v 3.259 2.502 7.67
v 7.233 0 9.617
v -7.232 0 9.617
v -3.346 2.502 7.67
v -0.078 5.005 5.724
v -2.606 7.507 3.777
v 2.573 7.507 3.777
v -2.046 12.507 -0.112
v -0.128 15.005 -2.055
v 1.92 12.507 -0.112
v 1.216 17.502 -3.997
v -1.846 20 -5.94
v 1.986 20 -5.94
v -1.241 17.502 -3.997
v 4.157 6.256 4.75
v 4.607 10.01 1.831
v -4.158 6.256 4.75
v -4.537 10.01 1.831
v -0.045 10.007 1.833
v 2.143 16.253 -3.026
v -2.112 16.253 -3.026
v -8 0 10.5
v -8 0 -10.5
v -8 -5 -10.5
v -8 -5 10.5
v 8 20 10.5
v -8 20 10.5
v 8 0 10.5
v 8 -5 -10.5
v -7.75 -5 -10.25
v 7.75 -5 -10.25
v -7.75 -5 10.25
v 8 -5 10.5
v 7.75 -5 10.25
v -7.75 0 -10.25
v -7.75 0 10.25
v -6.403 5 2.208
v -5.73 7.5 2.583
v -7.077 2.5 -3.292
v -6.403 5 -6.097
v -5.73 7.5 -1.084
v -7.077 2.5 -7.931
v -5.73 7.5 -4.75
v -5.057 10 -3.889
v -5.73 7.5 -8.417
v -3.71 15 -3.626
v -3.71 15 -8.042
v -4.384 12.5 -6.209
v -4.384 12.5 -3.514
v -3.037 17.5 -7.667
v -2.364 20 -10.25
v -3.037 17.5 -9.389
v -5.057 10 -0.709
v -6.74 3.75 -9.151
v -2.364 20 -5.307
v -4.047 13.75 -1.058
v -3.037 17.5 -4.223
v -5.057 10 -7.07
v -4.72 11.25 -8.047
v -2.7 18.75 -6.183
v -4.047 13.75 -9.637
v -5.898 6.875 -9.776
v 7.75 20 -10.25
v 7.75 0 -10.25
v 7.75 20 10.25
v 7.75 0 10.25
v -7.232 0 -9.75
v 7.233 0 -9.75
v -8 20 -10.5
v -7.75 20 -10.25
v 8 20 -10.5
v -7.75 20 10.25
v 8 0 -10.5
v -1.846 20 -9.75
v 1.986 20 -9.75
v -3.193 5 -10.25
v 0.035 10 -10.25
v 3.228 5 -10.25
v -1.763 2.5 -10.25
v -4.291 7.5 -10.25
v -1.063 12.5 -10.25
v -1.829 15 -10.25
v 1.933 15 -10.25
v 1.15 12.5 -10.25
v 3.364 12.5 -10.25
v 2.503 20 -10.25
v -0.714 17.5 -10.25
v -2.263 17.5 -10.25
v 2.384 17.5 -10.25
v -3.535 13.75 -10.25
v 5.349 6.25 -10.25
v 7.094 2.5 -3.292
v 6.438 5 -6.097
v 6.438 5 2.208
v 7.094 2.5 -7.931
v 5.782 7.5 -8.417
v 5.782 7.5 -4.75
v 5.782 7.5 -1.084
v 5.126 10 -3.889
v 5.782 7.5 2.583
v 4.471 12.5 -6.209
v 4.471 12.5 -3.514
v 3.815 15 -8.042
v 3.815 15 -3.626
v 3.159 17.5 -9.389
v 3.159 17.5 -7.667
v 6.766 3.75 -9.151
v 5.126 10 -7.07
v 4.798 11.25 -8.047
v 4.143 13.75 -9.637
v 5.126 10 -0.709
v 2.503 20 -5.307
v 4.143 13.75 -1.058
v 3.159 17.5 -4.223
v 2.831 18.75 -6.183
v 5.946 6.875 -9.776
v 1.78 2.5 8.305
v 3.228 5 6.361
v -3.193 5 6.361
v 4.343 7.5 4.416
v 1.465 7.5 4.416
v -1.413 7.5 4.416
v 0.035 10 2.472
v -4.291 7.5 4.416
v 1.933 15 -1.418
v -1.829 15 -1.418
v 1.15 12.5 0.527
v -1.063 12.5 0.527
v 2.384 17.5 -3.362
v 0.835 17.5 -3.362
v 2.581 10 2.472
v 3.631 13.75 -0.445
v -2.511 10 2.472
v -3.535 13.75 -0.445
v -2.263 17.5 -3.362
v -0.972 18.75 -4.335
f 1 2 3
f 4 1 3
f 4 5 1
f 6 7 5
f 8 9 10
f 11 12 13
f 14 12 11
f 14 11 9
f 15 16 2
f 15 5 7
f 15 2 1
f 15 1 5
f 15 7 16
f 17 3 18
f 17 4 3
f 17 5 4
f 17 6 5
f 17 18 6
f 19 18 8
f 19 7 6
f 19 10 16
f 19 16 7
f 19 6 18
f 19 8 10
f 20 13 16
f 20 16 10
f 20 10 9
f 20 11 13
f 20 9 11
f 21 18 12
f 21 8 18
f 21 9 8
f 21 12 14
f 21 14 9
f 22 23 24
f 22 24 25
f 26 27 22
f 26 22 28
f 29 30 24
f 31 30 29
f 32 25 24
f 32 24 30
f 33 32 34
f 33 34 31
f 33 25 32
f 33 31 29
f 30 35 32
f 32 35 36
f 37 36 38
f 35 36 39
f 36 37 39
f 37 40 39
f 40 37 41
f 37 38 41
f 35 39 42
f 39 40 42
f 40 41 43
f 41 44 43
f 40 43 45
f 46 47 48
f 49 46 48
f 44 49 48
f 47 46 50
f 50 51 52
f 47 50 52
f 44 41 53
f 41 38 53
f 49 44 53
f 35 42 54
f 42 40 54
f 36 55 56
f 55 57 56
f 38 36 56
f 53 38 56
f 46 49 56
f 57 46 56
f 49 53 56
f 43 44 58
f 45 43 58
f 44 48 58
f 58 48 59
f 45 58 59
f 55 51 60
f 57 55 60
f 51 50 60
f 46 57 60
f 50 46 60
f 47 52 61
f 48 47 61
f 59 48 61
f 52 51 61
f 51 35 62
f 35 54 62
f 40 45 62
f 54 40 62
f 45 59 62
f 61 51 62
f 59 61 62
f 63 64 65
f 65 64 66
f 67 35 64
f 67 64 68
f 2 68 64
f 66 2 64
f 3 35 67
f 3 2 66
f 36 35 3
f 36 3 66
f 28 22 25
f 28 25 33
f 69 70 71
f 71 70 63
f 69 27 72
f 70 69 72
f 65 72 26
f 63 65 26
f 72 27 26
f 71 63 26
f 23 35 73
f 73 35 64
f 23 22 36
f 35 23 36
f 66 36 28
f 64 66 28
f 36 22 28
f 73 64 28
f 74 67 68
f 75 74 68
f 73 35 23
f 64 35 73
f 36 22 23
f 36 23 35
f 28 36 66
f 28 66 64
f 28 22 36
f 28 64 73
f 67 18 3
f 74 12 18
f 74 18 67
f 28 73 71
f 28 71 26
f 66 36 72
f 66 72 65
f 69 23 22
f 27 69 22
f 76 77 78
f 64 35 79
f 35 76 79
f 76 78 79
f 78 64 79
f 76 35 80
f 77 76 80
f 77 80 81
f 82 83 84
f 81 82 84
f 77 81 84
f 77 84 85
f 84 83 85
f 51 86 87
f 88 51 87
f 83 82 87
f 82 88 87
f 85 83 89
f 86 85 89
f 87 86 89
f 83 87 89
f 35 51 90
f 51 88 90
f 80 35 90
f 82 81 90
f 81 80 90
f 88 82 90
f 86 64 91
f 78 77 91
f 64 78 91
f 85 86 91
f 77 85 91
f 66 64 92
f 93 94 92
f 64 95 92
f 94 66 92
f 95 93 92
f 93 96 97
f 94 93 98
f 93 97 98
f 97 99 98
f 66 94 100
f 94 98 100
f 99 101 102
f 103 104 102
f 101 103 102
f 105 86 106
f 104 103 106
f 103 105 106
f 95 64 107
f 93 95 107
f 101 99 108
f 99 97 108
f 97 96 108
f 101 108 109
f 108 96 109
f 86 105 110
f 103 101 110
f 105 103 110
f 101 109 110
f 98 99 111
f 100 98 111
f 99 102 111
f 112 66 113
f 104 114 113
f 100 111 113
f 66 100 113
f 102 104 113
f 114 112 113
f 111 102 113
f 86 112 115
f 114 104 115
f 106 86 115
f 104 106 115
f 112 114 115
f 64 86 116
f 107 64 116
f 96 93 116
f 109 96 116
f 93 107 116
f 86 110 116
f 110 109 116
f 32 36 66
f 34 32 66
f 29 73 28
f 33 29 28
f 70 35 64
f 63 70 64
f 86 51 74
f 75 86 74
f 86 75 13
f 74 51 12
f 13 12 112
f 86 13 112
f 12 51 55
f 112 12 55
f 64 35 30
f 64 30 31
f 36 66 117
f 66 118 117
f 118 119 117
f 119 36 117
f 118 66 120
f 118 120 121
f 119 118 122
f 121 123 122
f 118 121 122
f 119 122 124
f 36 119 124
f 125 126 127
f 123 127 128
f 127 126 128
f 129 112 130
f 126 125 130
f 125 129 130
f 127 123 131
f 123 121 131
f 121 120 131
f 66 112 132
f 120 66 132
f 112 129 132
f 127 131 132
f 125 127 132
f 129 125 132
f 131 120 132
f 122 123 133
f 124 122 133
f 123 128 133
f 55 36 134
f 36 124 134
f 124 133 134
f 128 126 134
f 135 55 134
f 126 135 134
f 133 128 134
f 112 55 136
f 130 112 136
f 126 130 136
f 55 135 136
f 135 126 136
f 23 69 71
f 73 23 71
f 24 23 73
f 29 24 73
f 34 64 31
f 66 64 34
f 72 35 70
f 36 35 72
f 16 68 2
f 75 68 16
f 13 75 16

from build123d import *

# Parameters (mm, degrees)
F0_W     = 16
F0_H     = 21
F0_W_2   = 15.5
F0_H_2   = 20.5
F1_DEPTH = 5
F2_DEPTH = 20
F3_W     = 4.8666046932
F3_H     = 4.943083223
F5_T     = -0.5


with BuildPart() as f1:
    # F0 (on Front) → F1 (new body)
    with BuildSketch(Plane.XZ):
        Rectangle(F0_W, F0_H)
        Rectangle(F0_W_2, F0_H_2, mode=Mode.SUBTRACT)
    extrude(amount=F1_DEPTH)


with BuildPart() as f2:
    # F2 (new): a face of the model
    f2_faces = [f1.part.faces().sort_by_distance(p)[0] for p in [
        (0, 0, 10.4735992424),
    ]]
    extrude(f2_faces, amount=F2_DEPTH)


with BuildPart() as f4:
    # F0 (on Front) → F4 section 0
    with BuildSketch(Plane.XZ):
        Rectangle(F0_W_2, F0_H_2)
    # F3 (on face) → F4 section 1
    with BuildSketch(Plane(origin=(0, 20, 0), x_dir=(-1, 0, 0), z_dir=(0, 1, 0))):
        with Locations((-0.069523463, -7.7784583885)):
            Rectangle(F3_W, F3_H)
    loft()

    # F5
    f5_openings = [f4.faces().sort_by_distance(p)[0] for p in [
        (0, 0, 0),
        (0.069523, 20, -7.778458),
    ]]
    offset(amount=F5_T, openings=f5_openings)


solid = Compound([f1.part, f2.part, f4.part])
